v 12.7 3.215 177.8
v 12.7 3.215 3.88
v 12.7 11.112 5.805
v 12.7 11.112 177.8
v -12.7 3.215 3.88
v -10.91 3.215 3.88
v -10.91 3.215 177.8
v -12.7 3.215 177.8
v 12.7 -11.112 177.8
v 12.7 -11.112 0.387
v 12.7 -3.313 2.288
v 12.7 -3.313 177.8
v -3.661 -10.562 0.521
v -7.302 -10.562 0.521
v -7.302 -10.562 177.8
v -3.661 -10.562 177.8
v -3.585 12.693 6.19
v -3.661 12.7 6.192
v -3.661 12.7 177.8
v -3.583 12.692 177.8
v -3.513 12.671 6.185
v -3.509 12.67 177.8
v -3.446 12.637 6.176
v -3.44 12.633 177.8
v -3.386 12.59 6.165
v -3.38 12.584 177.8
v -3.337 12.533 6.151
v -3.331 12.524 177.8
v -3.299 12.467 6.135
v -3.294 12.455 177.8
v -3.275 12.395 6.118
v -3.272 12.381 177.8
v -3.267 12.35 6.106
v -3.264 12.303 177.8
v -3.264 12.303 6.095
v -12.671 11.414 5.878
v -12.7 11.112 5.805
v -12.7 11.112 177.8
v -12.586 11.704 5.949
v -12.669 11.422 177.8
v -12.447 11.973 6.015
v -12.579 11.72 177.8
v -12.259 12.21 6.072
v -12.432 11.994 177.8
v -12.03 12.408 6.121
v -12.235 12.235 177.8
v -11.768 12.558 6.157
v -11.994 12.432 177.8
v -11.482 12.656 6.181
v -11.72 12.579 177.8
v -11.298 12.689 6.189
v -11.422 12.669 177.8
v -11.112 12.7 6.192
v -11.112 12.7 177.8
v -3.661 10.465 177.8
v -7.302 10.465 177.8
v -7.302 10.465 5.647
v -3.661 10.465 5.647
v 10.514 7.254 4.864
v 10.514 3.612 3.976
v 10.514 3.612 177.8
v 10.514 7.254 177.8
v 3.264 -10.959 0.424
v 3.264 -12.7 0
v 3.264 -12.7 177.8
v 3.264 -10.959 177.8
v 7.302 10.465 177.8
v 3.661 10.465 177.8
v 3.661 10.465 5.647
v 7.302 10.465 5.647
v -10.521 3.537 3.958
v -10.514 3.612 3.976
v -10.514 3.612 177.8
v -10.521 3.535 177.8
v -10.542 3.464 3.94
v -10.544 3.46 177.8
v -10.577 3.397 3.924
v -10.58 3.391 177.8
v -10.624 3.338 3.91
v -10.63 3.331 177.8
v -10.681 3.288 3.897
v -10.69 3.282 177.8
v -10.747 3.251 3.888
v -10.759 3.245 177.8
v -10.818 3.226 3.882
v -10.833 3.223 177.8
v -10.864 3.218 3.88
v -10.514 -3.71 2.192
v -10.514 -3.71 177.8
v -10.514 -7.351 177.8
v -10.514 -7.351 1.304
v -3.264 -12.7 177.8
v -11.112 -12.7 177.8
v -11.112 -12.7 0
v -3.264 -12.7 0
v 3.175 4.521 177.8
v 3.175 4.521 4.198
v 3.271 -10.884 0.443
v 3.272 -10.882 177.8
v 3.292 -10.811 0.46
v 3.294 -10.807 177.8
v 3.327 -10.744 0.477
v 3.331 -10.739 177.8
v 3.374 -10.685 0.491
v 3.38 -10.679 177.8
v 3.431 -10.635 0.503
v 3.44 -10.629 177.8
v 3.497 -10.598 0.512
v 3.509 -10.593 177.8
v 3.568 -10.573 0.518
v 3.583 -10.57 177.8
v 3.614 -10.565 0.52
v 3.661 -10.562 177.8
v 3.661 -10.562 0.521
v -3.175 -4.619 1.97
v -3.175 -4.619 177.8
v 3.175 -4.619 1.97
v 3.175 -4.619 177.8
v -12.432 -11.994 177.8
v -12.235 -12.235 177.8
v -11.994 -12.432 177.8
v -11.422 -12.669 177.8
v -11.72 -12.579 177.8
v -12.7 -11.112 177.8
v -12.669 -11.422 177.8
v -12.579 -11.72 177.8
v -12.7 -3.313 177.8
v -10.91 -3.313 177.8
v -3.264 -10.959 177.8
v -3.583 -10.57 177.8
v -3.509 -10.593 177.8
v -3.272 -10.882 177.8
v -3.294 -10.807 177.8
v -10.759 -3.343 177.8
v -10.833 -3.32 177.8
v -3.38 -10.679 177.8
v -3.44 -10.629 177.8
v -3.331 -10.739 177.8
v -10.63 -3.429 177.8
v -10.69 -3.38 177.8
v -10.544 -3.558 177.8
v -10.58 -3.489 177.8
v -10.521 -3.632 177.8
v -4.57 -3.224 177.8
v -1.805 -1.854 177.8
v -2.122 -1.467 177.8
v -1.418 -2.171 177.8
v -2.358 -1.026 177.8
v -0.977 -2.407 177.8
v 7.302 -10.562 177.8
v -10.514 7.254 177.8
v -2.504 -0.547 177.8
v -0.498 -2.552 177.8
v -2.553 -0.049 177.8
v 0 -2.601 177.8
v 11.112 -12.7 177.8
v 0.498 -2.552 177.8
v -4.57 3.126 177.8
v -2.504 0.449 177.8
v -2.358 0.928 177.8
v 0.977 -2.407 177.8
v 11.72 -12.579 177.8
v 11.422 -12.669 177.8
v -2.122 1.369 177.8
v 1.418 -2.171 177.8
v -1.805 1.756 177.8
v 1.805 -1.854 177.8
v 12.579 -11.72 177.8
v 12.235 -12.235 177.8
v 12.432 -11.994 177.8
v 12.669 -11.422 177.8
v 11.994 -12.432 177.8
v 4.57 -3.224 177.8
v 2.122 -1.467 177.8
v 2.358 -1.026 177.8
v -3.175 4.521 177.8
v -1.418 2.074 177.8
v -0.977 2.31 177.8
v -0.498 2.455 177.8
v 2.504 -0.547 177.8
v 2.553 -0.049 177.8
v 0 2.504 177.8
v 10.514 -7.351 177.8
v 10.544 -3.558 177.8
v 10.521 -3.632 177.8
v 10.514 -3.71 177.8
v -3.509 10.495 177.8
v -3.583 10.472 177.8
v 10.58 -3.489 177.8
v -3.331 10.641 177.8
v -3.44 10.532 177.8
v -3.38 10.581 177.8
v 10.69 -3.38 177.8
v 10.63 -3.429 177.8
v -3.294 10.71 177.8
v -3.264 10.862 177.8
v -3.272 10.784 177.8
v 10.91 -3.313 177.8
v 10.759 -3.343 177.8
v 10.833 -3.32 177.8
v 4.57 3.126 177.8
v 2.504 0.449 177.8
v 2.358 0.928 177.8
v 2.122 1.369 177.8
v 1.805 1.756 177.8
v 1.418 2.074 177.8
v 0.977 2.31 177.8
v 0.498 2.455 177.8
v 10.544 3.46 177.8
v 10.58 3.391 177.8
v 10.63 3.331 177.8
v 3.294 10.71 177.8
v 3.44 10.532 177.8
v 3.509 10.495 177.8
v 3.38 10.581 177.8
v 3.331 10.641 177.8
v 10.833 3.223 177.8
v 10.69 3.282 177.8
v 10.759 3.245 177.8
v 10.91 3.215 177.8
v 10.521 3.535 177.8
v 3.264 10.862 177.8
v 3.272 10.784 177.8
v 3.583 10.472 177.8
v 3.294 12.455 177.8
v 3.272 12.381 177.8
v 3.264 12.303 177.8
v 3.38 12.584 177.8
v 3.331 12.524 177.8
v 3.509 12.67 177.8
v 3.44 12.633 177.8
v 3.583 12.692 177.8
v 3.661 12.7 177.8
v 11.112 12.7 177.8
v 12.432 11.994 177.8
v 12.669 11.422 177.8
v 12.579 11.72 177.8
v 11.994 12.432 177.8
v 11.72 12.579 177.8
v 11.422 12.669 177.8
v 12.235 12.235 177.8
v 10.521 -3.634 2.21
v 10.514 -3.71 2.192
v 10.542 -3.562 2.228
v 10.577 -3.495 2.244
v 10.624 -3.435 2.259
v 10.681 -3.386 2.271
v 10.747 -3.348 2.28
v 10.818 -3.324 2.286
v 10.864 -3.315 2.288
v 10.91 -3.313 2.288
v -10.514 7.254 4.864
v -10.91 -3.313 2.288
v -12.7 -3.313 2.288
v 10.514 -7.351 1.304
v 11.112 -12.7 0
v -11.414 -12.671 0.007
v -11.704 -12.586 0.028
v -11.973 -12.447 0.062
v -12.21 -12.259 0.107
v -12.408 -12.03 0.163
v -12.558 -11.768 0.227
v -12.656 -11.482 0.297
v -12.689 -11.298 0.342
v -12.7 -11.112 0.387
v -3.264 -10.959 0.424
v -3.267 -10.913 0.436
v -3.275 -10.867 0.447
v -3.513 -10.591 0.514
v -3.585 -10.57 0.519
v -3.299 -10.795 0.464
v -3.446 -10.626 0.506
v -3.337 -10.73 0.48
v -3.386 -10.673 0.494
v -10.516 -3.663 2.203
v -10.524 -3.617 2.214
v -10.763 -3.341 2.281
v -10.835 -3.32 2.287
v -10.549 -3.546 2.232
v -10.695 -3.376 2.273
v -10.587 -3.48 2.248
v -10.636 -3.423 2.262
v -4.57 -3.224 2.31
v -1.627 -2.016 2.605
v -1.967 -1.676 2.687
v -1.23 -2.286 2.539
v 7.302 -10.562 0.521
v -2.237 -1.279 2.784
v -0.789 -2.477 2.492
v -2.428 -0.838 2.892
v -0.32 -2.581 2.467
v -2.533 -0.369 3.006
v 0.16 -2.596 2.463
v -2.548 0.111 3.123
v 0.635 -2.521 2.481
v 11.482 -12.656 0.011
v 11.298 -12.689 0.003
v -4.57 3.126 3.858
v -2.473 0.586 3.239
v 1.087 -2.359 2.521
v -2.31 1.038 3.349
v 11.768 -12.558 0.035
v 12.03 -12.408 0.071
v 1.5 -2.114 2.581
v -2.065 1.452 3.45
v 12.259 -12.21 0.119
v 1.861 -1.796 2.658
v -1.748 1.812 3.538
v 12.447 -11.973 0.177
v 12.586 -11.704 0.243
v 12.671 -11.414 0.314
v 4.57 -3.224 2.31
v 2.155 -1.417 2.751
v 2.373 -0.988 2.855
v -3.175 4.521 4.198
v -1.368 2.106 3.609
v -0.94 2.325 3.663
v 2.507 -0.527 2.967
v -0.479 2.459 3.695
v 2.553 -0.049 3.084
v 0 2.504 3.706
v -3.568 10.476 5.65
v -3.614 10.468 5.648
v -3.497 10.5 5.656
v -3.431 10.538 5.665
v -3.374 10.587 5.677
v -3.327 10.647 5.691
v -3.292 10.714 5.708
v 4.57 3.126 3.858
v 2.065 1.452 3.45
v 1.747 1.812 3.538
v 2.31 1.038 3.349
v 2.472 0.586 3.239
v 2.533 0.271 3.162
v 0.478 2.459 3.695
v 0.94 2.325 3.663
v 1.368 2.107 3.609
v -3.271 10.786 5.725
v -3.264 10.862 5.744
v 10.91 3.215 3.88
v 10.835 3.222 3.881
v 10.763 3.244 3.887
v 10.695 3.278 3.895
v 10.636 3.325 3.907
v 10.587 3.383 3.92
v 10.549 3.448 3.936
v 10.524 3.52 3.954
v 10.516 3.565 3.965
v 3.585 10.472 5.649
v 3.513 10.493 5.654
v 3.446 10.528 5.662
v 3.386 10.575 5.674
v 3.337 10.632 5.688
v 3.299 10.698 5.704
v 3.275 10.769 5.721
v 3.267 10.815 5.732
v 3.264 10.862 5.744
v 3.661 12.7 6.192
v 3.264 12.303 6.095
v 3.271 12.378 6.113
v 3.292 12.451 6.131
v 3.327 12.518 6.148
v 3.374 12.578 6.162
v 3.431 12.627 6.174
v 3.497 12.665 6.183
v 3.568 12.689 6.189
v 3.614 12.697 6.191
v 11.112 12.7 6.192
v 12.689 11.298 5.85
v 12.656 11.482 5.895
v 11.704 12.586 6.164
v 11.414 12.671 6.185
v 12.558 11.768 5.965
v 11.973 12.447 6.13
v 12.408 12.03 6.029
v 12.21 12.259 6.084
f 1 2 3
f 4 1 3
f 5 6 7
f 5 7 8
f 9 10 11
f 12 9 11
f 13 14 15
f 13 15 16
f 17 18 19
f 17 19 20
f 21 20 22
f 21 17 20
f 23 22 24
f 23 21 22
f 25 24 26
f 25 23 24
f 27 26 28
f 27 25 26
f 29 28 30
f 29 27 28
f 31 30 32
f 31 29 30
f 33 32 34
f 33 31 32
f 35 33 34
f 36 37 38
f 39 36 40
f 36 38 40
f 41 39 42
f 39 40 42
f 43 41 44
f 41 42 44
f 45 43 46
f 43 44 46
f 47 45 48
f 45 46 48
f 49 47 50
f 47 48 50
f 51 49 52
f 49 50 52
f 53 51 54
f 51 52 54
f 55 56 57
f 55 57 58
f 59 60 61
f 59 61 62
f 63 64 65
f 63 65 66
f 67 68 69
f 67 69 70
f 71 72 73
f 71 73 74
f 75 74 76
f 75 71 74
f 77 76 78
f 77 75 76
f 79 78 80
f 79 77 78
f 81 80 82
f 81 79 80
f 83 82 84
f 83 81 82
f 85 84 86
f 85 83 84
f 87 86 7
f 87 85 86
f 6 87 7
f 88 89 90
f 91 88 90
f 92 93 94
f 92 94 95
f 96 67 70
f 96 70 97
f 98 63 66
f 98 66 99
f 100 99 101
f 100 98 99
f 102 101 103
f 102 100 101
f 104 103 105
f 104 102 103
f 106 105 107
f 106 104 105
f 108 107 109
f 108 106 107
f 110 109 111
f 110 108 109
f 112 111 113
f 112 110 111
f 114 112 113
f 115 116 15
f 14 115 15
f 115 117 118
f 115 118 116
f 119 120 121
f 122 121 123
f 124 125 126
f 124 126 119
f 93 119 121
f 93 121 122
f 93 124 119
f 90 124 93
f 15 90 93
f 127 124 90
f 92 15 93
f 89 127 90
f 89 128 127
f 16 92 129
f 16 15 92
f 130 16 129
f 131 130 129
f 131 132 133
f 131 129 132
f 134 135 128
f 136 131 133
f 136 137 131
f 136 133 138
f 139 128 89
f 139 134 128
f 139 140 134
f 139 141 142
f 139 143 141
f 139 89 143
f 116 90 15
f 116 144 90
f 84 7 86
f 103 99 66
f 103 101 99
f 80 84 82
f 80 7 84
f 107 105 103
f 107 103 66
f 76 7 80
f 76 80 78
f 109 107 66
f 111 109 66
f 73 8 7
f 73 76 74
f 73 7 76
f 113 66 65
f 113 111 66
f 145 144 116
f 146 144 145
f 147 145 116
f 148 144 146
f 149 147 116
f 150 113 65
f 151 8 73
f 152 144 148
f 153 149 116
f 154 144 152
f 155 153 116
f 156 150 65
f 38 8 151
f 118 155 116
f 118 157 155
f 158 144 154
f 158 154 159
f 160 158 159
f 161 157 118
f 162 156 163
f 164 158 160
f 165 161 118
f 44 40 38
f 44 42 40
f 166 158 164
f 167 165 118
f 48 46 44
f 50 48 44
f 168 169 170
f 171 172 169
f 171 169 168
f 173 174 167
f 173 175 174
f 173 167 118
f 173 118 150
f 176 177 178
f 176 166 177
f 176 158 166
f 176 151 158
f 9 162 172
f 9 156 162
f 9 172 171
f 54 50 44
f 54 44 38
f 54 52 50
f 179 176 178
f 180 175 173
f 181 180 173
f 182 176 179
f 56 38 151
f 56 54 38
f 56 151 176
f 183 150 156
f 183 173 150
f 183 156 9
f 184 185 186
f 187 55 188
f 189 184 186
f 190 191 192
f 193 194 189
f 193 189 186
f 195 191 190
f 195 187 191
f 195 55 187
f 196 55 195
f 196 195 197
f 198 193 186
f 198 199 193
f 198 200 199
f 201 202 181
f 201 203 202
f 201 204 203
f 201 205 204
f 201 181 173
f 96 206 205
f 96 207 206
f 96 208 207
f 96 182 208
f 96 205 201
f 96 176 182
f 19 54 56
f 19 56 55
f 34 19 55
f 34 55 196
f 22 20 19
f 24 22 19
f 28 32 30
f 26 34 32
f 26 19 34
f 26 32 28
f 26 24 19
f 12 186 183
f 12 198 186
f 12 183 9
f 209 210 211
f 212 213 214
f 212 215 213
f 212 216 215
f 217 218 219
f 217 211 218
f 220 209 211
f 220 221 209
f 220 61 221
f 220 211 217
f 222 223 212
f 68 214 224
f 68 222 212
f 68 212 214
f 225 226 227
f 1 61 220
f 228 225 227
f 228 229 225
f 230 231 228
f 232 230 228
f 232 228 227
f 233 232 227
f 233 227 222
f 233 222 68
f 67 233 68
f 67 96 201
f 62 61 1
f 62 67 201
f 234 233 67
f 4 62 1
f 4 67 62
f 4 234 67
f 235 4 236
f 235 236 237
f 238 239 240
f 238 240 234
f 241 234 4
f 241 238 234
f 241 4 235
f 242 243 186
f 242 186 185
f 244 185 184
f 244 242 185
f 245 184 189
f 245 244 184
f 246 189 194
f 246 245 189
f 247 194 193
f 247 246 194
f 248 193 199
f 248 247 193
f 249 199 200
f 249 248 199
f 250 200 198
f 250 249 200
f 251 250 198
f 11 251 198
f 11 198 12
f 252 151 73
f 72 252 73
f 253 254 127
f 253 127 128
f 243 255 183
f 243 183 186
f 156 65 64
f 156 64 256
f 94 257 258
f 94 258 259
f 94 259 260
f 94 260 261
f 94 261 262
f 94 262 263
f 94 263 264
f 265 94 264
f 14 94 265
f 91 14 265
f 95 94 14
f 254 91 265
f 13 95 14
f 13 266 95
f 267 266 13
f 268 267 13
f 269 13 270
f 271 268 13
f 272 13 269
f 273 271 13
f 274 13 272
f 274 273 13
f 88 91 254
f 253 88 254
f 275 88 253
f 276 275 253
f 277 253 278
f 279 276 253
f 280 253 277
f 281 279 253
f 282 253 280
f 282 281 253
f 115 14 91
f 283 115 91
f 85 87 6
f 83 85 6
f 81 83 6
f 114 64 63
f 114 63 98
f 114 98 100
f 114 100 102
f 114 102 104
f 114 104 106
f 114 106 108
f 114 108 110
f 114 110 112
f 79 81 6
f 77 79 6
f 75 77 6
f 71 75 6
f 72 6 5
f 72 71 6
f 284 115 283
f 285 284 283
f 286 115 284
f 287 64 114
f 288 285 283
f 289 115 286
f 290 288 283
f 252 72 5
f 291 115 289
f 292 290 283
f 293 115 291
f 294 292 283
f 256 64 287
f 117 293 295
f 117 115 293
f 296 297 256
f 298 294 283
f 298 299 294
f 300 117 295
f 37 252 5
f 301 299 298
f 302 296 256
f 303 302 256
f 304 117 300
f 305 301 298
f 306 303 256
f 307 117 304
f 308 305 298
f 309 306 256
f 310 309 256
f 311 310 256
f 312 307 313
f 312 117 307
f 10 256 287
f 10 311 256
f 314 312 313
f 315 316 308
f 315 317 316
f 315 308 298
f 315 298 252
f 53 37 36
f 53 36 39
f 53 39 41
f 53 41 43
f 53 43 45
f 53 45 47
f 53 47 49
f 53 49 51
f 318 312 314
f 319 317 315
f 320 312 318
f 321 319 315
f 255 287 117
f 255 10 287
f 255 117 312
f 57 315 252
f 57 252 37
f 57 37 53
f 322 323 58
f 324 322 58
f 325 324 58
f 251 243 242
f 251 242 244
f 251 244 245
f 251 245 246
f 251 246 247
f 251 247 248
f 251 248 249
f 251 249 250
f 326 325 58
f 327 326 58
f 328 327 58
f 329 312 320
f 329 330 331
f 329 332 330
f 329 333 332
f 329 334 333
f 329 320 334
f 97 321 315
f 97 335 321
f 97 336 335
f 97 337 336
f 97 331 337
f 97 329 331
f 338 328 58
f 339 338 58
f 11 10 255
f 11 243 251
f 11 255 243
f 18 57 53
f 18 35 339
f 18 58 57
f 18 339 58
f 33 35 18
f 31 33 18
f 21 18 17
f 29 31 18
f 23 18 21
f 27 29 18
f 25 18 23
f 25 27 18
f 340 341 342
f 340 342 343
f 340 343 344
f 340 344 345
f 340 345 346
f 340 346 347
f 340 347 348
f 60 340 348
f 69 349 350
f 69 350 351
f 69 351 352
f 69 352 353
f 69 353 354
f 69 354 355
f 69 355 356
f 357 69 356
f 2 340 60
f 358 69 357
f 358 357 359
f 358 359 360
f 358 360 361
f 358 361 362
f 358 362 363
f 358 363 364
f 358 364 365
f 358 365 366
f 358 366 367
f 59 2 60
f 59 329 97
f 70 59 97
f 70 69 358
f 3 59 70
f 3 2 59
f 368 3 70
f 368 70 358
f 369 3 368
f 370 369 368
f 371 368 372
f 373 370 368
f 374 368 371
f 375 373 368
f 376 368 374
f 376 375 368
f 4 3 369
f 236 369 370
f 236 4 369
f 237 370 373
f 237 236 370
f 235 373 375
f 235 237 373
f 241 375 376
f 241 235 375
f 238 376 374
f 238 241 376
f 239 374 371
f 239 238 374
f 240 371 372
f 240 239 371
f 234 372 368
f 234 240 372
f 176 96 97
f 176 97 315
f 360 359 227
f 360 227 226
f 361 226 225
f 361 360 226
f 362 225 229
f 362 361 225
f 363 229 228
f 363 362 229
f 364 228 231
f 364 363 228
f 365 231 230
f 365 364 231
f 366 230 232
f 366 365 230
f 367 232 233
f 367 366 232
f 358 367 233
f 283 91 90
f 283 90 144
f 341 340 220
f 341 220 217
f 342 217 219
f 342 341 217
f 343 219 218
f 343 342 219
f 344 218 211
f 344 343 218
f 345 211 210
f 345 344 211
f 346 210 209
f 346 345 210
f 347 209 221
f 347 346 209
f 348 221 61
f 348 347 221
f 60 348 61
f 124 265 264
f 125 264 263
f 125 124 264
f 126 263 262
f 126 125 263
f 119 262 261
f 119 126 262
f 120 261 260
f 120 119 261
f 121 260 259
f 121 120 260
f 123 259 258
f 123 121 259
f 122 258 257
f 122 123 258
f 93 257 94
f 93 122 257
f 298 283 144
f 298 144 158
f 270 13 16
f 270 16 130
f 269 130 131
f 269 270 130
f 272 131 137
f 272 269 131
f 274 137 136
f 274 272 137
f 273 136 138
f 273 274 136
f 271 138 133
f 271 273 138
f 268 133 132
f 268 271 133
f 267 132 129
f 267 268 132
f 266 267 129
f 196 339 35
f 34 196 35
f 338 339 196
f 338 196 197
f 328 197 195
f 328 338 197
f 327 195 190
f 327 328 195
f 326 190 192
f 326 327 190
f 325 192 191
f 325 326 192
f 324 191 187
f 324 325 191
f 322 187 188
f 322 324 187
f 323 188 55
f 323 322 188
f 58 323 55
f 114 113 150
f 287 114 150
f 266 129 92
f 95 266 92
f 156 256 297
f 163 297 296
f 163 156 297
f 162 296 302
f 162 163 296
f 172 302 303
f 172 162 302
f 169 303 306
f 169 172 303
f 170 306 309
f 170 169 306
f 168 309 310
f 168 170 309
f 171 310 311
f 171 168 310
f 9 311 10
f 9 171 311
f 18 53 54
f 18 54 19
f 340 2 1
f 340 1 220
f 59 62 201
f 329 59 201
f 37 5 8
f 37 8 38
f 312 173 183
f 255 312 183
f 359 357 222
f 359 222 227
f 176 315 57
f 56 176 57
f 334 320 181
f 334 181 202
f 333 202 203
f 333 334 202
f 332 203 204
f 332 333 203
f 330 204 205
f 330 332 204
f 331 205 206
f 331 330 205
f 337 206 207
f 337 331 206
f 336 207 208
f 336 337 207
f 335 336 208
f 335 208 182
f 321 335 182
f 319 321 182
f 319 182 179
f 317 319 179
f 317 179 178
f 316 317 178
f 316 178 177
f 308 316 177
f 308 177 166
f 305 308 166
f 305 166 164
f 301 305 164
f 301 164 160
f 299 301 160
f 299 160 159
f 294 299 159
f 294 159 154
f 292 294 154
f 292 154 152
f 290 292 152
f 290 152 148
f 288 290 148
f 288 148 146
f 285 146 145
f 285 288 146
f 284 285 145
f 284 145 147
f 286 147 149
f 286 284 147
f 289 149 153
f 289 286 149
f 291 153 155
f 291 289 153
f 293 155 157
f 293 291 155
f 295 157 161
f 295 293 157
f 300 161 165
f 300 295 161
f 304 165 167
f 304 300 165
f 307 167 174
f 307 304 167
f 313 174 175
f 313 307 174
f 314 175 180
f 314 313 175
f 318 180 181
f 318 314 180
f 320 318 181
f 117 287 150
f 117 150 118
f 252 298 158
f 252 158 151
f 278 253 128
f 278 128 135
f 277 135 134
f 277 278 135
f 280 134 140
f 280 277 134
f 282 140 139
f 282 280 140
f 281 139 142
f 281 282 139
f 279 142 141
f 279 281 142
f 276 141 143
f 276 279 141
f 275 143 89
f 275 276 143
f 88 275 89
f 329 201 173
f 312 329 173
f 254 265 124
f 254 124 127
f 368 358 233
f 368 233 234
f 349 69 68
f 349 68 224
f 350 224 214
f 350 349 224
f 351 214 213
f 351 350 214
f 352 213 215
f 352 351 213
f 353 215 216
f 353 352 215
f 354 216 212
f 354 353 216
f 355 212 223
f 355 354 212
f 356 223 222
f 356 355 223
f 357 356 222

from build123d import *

# Parameters (mm, degrees)
SKETCH1_W           = 25.4
SKETCH1_H           = 25.4
BOSS_EXTRUDE1_DEPTH = 177.8
FILLET1_R           = 1.5875
HOLE1_OUTLINE_R     = 2.5527
HOLE1_DEPTH         = 177.8
SKETCH7_W           = 6.5278
SKETCH7_H           = 2.2352
CUT_EXTRUDE2_DEPTH  = 177.8
FILLET4_R           = 0.396875
CIRPATTERN2_DEPTH   = 177.8
CUT_EXTRUDE3_DEPTH  = 181.05357536


# Read off the part's stored shape, not the designer's step: Hole1, CirPattern2
with BuildPart() as part:
    # Sketch1 → Boss-Extrude1 (new body)
    with BuildSketch(Plane.XY):
        Rectangle(SKETCH1_W, SKETCH1_H)
    extrude(amount=BOSS_EXTRUDE1_DEPTH)

    # Fillet1
    fillet1_edges = [part.edges().sort_by_distance(p)[0] for p in [
        (12.7, -12.7, 88.9),
        (-12.7, -12.7, 88.9),
        (-12.7, 12.7, 88.9),
        (12.7, 12.7, 88.9),
    ]]
    fillet(fillet1_edges, radius=FILLET1_R)

    # Hole1 outline → Hole1 (cut)
    with BuildSketch(Plane.XY):
        with Locations((0, -0.048792482)):
            Circle(HOLE1_OUTLINE_R)
    extrude(amount=HOLE1_DEPTH, mode=Mode.SUBTRACT)

    # Sketch7 → Cut-Extrude2 (cut)
    with BuildSketch(Plane.XY.offset(177.8)):
        with Locations((0, 11.5824)):
            Rectangle(SKETCH7_W, SKETCH7_H)
        Polygon((-3.175, 4.5212), (-7.3025, 10.4648), (7.3025, 10.4648), (3.175, 4.5212), align=None)
    extrude(amount=-CUT_EXTRUDE2_DEPTH, mode=Mode.SUBTRACT)

    # Fillet4
    fillet4_edges = [part.edges().sort_by_distance(p)[0] for p in [
        (-3.2639, 10.4648, 88.9),
        (-3.2639, 12.7, 88.9),
        (3.2639, 12.7, 88.9),
        (3.2639, 10.4648, 88.9),
    ]]
    fillet(fillet4_edges, radius=FILLET4_R)

    # CirPattern2 outline → CirPattern2 (cut)
    with BuildSketch(Plane.XY):
        with BuildLine():
            ThreePointArc((-3.660775, -10.562384964), (-3.380141996, -10.67862696), (-3.2639, -10.959259964))
            Line((-3.2639, -10.959259964), (-3.2639, -12.7))
            Line((-3.2639, -12.7), (3.2639, -12.7))
            Line((3.2639, -12.7), (3.2639, -10.959259964))
            ThreePointArc((3.2639, -10.959259964), (3.380141996, -10.67862696), (3.660775, -10.562384964))
            Line((3.660775, -10.562384964), (7.3025, -10.562384964))
            Line((7.3025, -10.562384964), (3.175, -4.618784964))
            Line((3.175, -4.618784964), (-3.175, -4.618784964))
            Line((-3.175, -4.618784964), (-7.3025, -10.562384964))
            Line((-7.3025, -10.562384964), (-3.660775, -10.562384964))
        make_face()
        with BuildLine():
            Line((-12.7, -3.312692482), (-10.910467482, -3.312692482))
            ThreePointArc((-10.910467482, -3.312692482), (-10.629834478, -3.428934478), (-10.513592482, -3.709567482))
            Line((-10.513592482, -3.709567482), (-10.513592482, -7.351292482))
            Line((-10.513592482, -7.351292482), (-4.569992482, -3.223792482))
            Line((-4.569992482, -3.223792482), (-4.569992482, 3.126207518))
            Line((-4.569992482, 3.126207518), (-10.513592482, 7.253707518))
            Line((-10.513592482, 7.253707518), (-10.513592482, 3.611982518))
            ThreePointArc((-10.513592482, 3.611982518), (-10.629834478, 3.331349514), (-10.910467482, 3.215107518))
            Line((-10.910467482, 3.215107518), (-12.7, 3.215107518))
            Line((-12.7, 3.215107518), (-12.7, -3.312692482))
        make_face()
        with BuildLine():
            ThreePointArc((10.513592482, -3.709567482), (10.629834478, -3.428934478), (10.910467482, -3.312692482))
            Line((10.910467482, -3.312692482), (12.7, -3.312692482))
            Line((12.7, -3.312692482), (12.7, 3.215107518))
            Line((12.7, 3.215107518), (10.910467482, 3.215107518))
            ThreePointArc((10.910467482, 3.215107518), (10.629834478, 3.331349514), (10.513592482, 3.611982518))
            Line((10.513592482, 3.611982518), (10.513592482, 7.253707518))
            Line((10.513592482, 7.253707518), (4.569992482, 3.126207518))
            Line((4.569992482, 3.126207518), (4.569992482, -3.223792482))
            Line((4.569992482, -3.223792482), (10.513592482, -7.351292482))
            Line((10.513592482, -7.351292482), (10.513592482, -3.709567482))
        make_face()
    extrude(amount=CIRPATTERN2_DEPTH, mode=Mode.SUBTRACT)

    # Sketch8 → Cut-Extrude3 (cut, through all)
    with BuildSketch(Plane(origin=(12.7, 0, 0), x_dir=(0, 0, -1), z_dir=(1, 0, 0))):
        Polygon((0, 12.7), (0, -12.7), (-6.191852564, 12.7), align=None)
    extrude(amount=-CUT_EXTRUDE3_DEPTH, mode=Mode.SUBTRACT)


solid = part.part
